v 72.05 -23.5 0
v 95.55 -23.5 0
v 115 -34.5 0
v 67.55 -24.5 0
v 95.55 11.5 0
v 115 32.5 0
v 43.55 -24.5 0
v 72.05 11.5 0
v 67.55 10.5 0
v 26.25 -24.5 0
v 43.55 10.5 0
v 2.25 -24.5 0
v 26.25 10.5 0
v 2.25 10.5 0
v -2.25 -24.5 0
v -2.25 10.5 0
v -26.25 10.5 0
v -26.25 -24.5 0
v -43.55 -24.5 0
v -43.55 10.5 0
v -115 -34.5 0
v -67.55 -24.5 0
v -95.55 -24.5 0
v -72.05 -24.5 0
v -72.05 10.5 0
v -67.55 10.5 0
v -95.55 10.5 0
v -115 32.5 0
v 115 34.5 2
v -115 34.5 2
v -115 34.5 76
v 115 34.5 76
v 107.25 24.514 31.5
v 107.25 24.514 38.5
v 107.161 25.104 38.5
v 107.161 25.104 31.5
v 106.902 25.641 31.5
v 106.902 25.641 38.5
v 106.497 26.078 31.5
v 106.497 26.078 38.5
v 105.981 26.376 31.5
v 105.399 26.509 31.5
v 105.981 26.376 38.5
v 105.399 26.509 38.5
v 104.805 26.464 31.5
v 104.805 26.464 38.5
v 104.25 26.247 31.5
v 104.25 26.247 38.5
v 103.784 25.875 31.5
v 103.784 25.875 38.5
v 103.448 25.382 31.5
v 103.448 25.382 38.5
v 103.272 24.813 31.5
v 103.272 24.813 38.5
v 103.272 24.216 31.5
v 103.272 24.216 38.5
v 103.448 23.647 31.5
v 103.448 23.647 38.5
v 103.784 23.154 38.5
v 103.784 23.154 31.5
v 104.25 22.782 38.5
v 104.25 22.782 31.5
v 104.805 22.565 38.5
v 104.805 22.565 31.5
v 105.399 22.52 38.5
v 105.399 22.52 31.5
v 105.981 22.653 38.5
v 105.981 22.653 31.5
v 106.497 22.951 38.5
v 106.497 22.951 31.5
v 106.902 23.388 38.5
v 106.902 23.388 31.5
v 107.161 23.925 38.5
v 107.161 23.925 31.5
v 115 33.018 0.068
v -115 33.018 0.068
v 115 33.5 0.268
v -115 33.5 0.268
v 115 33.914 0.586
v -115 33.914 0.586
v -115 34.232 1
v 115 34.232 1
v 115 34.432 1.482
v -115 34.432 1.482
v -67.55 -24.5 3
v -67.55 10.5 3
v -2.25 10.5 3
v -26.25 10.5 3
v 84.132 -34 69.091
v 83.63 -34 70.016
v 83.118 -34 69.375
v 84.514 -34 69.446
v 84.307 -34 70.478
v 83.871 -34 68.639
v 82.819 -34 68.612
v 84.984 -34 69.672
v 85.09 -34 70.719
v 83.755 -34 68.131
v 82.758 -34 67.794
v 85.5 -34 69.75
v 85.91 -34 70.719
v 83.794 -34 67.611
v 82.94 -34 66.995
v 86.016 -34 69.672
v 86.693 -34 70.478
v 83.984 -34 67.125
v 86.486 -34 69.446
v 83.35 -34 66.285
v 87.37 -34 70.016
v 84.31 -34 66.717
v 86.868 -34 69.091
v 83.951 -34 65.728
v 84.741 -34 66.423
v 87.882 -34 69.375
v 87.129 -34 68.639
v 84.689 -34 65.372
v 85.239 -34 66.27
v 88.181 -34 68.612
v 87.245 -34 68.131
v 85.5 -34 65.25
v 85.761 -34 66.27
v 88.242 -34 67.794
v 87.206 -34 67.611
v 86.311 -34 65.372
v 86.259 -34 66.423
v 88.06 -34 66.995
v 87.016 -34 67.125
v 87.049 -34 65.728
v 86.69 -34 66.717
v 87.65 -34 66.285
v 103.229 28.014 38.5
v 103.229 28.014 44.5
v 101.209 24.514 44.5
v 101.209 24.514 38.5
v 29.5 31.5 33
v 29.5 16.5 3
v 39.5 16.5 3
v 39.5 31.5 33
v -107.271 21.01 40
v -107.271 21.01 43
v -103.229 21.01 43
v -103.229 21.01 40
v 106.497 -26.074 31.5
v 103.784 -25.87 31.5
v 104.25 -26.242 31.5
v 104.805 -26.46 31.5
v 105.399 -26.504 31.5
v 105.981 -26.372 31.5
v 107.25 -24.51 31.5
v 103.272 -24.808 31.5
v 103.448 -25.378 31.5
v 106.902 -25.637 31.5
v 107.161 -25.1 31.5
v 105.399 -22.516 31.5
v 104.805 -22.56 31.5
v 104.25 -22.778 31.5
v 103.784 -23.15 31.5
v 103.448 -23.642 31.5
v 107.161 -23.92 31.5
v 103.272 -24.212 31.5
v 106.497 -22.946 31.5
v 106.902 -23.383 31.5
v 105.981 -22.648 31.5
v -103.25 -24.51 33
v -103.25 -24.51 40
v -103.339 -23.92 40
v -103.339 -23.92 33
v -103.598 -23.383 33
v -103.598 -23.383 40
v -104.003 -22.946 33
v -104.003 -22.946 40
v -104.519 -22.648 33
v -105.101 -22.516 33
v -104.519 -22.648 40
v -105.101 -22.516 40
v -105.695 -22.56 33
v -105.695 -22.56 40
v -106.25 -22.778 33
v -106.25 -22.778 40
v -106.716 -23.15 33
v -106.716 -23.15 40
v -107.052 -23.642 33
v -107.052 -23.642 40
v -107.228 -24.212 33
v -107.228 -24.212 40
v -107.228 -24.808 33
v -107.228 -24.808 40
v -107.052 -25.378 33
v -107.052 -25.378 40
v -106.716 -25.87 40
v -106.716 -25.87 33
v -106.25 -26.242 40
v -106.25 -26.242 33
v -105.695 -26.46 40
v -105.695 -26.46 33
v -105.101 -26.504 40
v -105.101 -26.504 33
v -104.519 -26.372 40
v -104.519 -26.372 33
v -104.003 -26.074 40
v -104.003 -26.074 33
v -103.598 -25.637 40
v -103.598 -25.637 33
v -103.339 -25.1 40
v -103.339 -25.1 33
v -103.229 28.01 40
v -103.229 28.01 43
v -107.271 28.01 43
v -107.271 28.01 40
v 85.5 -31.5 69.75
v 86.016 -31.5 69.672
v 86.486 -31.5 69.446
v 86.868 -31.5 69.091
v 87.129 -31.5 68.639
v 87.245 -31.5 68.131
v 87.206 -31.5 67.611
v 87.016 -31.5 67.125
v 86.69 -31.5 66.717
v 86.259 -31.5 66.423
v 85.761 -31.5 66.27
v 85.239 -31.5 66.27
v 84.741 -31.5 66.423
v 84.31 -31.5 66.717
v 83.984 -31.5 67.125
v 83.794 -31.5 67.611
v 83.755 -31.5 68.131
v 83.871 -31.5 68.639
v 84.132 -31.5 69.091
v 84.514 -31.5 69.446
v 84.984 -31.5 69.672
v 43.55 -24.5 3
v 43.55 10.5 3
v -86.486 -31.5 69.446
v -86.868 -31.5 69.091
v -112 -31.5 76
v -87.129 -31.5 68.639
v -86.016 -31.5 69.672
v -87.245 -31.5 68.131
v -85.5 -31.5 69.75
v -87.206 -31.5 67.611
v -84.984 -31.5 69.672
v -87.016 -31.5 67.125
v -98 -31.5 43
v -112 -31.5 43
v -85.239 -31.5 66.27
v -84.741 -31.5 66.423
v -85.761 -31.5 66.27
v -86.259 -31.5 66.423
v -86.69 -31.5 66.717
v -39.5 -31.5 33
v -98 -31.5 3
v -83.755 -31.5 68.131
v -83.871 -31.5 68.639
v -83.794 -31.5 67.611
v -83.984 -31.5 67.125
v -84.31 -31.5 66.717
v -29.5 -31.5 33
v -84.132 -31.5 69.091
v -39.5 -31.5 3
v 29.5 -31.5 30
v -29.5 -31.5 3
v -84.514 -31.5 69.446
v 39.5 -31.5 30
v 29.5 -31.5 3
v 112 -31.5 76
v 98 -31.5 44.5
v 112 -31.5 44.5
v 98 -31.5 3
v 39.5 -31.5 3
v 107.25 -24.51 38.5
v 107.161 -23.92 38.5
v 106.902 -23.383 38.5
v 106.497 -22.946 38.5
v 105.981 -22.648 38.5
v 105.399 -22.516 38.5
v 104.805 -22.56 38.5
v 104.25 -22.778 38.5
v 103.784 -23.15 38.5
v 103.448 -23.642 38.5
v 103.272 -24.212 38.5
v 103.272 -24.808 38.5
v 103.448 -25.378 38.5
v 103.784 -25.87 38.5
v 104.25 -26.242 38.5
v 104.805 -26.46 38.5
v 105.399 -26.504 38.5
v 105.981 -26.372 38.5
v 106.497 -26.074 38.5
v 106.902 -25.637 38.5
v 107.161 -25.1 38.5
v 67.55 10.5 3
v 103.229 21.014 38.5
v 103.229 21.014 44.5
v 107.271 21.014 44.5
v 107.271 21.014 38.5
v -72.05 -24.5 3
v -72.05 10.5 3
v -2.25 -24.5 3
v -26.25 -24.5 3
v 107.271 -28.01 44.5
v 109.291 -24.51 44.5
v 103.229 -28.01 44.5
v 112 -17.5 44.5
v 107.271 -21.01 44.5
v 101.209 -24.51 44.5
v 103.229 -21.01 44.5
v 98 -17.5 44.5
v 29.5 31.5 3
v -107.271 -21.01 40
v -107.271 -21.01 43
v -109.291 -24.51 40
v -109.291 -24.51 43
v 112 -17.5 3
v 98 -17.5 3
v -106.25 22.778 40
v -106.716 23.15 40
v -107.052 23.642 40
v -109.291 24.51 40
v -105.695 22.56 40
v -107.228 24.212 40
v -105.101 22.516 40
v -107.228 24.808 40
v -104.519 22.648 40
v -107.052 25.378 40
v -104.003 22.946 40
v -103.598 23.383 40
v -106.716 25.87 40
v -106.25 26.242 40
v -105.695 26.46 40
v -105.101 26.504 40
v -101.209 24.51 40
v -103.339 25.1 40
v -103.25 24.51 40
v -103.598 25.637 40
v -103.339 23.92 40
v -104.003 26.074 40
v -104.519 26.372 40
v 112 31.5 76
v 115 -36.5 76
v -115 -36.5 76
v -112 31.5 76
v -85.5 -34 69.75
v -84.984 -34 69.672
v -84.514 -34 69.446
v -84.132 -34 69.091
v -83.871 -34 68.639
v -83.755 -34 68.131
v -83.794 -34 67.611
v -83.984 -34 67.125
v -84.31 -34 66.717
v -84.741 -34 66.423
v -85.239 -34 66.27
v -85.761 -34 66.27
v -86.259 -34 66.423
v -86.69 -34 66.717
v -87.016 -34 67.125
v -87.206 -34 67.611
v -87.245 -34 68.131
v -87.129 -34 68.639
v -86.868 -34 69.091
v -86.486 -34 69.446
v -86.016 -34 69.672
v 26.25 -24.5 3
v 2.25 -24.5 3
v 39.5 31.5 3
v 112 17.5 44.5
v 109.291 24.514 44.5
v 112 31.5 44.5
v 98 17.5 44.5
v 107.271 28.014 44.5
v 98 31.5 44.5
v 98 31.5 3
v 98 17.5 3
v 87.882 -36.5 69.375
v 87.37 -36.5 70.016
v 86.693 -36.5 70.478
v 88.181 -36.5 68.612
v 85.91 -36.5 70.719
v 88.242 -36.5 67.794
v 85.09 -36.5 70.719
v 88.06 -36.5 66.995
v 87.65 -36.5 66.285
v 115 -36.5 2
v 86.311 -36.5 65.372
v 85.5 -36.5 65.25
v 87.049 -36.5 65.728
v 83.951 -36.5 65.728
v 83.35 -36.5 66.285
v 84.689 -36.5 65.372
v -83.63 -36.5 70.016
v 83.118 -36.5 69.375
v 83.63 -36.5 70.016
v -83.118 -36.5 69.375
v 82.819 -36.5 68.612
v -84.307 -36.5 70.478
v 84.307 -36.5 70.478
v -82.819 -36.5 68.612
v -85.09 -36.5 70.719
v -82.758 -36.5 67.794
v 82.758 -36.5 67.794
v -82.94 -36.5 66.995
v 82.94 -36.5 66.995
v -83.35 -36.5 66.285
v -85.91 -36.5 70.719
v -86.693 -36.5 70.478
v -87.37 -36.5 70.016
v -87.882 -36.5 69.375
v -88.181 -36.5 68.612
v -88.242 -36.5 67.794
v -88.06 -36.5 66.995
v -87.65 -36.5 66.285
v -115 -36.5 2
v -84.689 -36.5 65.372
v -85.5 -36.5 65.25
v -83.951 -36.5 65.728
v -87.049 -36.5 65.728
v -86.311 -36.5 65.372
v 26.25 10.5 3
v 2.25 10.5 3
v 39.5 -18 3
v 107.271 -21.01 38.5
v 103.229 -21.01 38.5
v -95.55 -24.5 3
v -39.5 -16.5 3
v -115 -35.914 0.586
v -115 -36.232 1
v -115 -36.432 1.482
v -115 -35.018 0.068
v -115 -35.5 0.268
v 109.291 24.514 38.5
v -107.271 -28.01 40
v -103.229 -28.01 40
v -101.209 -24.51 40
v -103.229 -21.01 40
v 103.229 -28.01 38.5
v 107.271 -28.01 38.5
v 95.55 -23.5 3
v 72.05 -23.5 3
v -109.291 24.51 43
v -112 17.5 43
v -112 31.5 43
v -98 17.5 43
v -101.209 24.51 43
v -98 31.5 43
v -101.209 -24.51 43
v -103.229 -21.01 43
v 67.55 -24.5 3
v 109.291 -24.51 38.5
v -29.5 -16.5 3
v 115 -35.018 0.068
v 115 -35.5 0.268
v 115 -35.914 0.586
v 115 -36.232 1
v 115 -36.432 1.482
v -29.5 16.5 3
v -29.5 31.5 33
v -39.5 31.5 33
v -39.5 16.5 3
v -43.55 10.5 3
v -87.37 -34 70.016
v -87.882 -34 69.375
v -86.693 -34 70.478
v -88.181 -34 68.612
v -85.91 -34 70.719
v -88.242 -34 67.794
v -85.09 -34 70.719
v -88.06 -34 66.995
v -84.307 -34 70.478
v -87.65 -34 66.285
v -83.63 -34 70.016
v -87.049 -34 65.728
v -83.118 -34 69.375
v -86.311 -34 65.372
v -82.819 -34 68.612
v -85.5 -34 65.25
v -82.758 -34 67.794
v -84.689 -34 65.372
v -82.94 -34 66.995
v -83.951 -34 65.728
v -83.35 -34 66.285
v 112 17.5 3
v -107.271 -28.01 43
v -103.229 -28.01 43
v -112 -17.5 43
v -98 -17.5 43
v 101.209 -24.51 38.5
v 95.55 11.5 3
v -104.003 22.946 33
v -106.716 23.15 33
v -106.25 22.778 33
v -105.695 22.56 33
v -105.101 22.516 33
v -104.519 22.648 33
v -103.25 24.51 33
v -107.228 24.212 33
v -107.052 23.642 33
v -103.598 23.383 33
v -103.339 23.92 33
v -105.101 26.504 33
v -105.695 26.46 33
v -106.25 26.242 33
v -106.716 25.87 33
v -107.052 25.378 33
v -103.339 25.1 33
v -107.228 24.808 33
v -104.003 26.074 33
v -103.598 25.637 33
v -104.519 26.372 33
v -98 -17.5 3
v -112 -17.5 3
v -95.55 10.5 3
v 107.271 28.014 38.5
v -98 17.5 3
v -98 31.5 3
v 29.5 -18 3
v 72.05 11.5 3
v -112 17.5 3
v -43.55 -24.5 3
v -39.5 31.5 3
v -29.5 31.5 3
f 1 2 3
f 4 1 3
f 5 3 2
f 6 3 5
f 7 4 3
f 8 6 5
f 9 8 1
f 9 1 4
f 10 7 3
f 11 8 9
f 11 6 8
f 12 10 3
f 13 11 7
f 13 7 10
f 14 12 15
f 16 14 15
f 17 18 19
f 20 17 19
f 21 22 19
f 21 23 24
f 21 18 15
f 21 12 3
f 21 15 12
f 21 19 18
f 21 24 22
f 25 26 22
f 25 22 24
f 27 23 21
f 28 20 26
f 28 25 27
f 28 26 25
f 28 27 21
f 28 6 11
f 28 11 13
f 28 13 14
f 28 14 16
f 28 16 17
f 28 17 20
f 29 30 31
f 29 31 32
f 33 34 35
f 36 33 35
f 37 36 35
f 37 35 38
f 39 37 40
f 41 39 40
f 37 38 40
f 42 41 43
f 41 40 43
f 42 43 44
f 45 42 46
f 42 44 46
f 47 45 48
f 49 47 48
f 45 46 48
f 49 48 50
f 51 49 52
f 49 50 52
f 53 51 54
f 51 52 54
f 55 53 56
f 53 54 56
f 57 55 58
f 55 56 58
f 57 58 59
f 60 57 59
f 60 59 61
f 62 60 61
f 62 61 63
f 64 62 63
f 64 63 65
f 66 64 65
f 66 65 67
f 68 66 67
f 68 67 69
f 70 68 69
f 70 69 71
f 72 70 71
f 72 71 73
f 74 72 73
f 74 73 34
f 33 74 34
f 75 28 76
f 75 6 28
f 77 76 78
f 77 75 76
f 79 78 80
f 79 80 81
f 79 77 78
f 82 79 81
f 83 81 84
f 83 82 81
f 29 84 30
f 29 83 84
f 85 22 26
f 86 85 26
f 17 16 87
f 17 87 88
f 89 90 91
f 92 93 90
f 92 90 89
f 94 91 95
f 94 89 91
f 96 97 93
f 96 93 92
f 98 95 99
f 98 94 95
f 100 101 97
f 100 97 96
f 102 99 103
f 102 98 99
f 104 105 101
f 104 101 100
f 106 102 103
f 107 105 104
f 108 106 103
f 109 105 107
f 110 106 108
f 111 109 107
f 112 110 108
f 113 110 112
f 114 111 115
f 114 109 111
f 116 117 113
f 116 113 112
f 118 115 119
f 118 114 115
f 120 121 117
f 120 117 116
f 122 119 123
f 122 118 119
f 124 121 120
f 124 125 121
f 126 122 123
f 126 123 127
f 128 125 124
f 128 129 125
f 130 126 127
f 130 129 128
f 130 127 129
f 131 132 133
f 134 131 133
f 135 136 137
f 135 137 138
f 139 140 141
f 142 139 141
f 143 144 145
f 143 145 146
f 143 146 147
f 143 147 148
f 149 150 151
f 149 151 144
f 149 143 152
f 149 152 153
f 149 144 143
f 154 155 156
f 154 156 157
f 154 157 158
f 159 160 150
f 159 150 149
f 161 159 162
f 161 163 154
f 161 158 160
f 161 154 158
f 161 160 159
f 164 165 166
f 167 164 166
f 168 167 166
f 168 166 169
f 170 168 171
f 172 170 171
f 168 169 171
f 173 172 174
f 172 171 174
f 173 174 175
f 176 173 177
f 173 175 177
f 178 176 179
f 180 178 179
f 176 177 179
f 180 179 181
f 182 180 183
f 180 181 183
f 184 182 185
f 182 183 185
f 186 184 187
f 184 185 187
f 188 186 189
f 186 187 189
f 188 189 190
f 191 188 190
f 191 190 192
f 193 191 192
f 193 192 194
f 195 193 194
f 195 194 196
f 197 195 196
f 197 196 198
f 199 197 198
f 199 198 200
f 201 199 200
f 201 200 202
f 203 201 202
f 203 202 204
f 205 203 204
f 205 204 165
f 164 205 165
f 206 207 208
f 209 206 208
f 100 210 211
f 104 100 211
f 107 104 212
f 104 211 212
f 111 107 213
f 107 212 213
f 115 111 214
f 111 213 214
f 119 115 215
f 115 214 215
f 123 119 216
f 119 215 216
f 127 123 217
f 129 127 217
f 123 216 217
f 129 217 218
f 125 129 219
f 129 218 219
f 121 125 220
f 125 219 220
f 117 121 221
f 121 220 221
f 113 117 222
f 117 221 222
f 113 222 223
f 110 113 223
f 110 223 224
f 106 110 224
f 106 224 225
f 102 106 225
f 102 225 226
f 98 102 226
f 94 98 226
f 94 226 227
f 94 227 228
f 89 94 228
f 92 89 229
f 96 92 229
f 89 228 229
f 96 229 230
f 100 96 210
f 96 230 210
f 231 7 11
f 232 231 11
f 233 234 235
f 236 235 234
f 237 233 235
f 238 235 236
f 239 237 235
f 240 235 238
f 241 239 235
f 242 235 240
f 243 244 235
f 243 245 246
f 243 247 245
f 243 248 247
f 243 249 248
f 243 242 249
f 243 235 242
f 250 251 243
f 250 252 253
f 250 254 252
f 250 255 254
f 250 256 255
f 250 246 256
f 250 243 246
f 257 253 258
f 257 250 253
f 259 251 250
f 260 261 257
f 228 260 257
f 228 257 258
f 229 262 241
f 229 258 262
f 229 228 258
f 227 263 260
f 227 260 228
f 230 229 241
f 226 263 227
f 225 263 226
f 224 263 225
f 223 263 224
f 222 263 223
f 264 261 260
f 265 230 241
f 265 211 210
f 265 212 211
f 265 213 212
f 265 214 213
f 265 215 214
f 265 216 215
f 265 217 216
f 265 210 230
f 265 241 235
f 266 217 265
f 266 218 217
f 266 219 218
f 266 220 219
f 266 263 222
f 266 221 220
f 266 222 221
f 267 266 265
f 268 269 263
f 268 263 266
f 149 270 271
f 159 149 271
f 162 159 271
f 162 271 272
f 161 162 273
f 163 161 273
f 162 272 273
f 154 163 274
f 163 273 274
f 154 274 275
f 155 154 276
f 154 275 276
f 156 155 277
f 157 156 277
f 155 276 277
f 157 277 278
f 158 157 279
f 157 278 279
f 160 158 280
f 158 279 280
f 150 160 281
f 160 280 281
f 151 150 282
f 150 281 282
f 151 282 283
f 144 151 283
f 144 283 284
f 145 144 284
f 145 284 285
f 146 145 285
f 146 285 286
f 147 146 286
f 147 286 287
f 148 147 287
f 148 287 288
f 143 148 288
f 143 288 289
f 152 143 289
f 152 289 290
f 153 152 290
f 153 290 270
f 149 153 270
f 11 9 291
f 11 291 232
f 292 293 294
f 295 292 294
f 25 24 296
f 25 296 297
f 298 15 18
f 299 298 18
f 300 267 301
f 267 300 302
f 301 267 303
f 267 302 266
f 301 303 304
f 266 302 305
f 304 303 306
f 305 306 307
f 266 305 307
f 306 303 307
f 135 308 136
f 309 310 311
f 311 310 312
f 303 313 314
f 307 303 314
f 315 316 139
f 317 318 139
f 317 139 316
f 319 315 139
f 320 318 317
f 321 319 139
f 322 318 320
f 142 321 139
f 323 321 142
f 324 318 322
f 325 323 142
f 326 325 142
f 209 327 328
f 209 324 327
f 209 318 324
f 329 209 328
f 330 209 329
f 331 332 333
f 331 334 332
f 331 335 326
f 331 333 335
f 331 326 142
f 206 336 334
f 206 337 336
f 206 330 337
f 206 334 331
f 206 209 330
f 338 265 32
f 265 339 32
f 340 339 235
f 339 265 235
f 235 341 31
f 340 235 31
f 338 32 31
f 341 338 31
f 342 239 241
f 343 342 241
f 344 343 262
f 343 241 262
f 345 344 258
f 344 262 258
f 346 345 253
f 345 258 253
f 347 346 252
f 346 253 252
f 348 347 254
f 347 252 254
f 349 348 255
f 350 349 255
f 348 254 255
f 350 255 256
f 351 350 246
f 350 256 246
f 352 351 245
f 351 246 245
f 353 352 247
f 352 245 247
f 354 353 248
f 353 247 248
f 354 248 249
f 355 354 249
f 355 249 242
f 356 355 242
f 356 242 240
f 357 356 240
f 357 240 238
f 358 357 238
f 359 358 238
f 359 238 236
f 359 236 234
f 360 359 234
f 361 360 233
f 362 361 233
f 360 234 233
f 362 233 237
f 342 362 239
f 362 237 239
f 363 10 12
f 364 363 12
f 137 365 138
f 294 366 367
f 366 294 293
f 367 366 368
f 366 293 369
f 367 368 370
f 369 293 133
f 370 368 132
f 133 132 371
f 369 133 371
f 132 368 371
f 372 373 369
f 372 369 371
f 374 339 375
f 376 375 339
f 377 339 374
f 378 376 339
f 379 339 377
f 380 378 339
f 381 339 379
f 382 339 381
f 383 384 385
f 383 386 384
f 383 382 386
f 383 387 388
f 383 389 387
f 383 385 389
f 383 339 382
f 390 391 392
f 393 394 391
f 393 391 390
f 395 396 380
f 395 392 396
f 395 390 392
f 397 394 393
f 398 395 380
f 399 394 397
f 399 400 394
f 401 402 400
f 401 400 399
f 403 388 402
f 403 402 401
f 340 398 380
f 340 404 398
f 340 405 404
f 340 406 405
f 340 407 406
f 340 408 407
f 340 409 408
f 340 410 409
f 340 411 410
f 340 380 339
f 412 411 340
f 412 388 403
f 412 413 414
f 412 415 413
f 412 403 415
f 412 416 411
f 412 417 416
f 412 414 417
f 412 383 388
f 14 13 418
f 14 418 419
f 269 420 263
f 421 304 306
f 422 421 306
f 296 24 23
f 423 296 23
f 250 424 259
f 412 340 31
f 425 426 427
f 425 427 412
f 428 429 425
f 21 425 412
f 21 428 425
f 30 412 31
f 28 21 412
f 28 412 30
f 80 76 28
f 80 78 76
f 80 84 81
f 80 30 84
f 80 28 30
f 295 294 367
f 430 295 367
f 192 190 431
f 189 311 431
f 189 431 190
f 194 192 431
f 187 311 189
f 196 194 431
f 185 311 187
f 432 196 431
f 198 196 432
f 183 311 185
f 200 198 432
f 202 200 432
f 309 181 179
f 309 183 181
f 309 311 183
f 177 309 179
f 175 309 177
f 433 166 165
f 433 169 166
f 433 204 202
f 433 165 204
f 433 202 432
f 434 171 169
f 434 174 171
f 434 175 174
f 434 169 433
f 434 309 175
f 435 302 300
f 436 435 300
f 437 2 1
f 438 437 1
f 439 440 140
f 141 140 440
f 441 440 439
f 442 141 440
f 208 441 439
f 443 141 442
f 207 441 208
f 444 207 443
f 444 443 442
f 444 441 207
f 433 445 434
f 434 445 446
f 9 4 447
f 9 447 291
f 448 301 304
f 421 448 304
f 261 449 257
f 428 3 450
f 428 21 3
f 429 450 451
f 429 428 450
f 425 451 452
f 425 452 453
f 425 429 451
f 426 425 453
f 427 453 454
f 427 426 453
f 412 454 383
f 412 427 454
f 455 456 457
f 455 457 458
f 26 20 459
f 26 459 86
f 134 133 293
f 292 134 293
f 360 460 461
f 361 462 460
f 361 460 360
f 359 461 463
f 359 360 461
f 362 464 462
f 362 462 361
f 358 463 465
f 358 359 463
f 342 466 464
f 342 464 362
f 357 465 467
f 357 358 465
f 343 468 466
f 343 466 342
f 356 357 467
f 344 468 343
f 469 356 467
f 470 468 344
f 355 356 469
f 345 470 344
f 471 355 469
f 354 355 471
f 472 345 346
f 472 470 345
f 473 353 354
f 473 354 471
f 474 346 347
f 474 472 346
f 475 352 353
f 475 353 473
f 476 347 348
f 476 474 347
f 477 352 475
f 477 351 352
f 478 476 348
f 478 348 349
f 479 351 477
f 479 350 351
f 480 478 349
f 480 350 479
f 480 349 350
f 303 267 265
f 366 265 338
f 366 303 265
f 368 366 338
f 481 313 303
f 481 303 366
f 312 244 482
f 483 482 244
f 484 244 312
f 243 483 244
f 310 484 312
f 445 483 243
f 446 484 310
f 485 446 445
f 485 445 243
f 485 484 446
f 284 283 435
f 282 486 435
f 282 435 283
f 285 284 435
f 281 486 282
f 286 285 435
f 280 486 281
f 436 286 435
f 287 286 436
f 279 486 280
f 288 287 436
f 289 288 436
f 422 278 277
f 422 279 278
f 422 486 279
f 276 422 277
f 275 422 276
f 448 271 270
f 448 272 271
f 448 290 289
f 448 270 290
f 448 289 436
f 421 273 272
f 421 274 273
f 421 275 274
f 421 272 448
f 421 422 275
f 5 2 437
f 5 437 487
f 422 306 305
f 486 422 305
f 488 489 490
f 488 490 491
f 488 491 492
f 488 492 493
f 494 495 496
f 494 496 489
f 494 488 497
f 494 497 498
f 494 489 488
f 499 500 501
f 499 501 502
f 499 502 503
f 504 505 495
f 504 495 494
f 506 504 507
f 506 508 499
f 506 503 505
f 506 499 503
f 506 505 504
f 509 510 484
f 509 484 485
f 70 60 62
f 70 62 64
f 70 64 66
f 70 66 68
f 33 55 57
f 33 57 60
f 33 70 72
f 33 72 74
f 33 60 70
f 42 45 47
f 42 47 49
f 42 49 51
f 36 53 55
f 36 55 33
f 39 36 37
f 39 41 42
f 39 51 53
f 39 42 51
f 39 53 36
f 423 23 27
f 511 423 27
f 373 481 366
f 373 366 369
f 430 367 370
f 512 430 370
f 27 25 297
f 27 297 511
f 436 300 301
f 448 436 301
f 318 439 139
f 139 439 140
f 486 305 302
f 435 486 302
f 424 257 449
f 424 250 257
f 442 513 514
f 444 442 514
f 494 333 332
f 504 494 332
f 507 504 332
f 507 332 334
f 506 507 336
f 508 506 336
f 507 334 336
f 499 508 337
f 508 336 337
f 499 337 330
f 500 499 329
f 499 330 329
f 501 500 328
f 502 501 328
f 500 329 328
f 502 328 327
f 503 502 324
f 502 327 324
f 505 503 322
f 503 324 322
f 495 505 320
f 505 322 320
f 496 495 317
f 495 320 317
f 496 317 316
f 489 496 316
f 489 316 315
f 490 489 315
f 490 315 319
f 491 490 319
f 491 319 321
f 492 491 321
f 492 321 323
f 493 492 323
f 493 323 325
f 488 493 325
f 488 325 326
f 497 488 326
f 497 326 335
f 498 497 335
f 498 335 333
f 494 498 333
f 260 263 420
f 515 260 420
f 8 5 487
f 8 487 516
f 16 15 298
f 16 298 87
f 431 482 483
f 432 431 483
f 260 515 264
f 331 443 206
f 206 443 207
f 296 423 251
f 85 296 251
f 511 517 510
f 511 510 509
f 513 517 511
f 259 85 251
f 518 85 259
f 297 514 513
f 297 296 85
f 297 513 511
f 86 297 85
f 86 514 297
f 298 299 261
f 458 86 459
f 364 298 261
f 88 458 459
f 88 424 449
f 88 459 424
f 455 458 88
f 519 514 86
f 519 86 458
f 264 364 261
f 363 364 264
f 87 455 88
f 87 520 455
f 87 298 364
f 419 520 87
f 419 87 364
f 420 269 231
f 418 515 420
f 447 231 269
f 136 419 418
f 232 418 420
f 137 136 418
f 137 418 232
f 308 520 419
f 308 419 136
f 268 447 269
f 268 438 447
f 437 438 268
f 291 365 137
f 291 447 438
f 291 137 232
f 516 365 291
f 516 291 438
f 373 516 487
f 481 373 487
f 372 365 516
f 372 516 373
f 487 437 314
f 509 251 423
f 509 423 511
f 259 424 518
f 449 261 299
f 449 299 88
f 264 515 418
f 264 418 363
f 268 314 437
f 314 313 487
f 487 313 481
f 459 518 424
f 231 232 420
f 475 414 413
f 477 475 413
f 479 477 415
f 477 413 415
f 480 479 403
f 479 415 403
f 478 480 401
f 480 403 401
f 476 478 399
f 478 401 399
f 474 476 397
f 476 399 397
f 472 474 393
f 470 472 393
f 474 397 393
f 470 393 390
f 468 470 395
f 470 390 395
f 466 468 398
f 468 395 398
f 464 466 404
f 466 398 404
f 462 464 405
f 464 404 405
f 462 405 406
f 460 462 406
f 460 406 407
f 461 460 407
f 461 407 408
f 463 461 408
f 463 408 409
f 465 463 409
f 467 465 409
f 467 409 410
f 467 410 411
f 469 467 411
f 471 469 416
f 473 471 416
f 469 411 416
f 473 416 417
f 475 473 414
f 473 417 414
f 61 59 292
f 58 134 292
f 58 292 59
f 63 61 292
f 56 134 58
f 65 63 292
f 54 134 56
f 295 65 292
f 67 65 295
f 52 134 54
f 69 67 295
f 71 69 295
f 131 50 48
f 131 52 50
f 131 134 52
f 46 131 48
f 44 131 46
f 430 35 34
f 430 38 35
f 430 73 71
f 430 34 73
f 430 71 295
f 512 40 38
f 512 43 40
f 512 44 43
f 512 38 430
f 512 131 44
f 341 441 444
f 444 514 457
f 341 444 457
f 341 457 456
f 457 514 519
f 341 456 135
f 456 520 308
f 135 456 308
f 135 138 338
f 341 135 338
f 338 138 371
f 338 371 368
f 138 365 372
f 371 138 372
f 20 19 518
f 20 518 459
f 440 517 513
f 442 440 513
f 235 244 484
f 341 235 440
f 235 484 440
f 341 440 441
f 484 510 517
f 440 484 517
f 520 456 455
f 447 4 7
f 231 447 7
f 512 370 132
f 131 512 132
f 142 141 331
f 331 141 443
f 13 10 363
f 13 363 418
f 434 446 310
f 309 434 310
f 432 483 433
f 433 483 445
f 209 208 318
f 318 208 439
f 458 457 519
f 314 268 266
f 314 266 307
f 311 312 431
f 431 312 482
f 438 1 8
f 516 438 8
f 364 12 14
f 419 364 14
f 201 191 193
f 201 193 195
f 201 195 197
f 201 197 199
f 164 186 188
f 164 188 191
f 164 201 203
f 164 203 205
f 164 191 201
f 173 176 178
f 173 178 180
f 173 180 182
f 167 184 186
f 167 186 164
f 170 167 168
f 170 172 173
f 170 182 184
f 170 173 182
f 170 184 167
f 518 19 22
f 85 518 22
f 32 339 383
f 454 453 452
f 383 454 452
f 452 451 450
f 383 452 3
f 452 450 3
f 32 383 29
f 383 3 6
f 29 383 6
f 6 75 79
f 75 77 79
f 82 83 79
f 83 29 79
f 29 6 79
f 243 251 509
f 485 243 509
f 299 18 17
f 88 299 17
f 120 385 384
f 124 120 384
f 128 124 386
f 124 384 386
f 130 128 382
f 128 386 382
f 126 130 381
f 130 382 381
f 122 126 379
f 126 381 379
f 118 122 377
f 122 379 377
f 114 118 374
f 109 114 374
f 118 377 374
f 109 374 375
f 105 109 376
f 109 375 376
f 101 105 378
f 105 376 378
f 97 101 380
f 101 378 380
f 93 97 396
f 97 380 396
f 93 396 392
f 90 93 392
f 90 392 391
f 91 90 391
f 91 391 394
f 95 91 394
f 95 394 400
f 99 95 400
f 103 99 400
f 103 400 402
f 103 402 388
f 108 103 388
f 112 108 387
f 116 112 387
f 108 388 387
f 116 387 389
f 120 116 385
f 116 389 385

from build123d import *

# Parameters (mm, degrees)
SKETCH_1_W           = 224
SKETCH_1_H           = 63
EXTRUDE_6_DEPTH      = 3
SKETCH_1_3_W         = 230
SKETCH_1_3_H         = 69
SKETCH_1_3_W_2       = 224
SKETCH_1_3_H_2       = 63
EXTRUDE_1_DEPTH      = 76
SKETCH_6_W           = 23.5
SKETCH_6_H           = 35
SKETCH_6_W_2         = 24
CUT_EXTRUDE_1_DEPTH  = 4
SKETCH_8_W           = 14
SKETCH_8_H           = 14
EXTRUDE_8_DEPTH      = 40
SKETCH_11_R          = 2
CUT_EXTRUDE_2_DEPTH  = 10
CUT_EXTRUDE_4_DEPTH  = 3
SKETCH_14_W          = 14
SKETCH_14_H          = 14
EXTRUDE_9_DEPTH      = 44.5
SKETCH_15_R          = 2
CUT_EXTRUDE_5_DEPTH  = 13
CUT_EXTRUDE_11_DEPTH = 6
EXTRUDE_10_DEPTH     = 5
EXTRUDE_11_DEPTH     = 5
SKETCH_30_W          = 230
SKETCH_30_H          = 2
EXTRUDE_13_DEPTH     = 76
FILLET_3_R           = 2
SKETCH_31_R          = 2.75
CUT_EXTRUDE_13_DEPTH = 2.5
SKETCH_28_R          = 1.75
CUT_EXTRUDE_14_DEPTH = 2.5


with BuildPart() as part:
    # 草图1 → 凸台-拉伸6 (new body)
    with BuildSketch(Plane.XY):
        Rectangle(SKETCH_1_W, SKETCH_1_H)
    extrude(amount=EXTRUDE_6_DEPTH)

    # 草图1<3> → 拉伸-薄壁1 (add)
    with BuildSketch(Plane.XY):
        Rectangle(SKETCH_1_3_W, SKETCH_1_3_H)
        Rectangle(SKETCH_1_3_W_2, SKETCH_1_3_H_2, mode=Mode.SUBTRACT)
    extrude(amount=EXTRUDE_1_DEPTH)

    # 草图6 → 切除-拉伸1 (cut)
    with BuildSketch(Plane(origin=(0, 0, 0), x_dir=(-1, 0, 0), z_dir=(0, 0, -1))):
        with Locations((-83.8, -6)):
            Rectangle(SKETCH_6_W, SKETCH_6_H)
        with Locations((-55.55, -7)):
            Rectangle(SKETCH_6_W_2, SKETCH_6_H)
        with Locations((-14.25, -7)):
            Rectangle(SKETCH_6_W_2, SKETCH_6_H)
        with Locations((14.25, -7)):
            Rectangle(SKETCH_6_W_2, SKETCH_6_H)
        with Locations((55.55, -7)):
            Rectangle(SKETCH_6_W_2, SKETCH_6_H)
        with Locations((83.8, -7)):
            Rectangle(SKETCH_6_W, SKETCH_6_H)
    extrude(amount=-CUT_EXTRUDE_1_DEPTH, mode=Mode.SUBTRACT)

    # 草图8 → 凸台-拉伸8 (add)
    with BuildSketch(Plane.XY.offset(3)):
        with Locations((-105, 24.5)):
            Rectangle(SKETCH_8_W, SKETCH_8_H)
        with Locations((-105, -24.5)):
            Rectangle(SKETCH_8_W, SKETCH_8_H)
    extrude(amount=EXTRUDE_8_DEPTH)

    # 草图11 → 切除-拉伸2 (cut)
    with BuildSketch(Plane.XY.offset(43)):
        with Locations((-105.25, 24.51)):
            Circle(SKETCH_11_R)
        with Locations((-105.25, -24.51)):
            Circle(SKETCH_11_R)
    extrude(amount=-CUT_EXTRUDE_2_DEPTH, mode=Mode.SUBTRACT)

    # 草图12<2> → 切除-拉伸4 (cut)
    with BuildSketch(Plane.XY.offset(43)):
        Polygon((-107.270725942, 28.01), (-109.291451884, 24.51), (-107.270725942, 21.01), (-103.229274058, 21.01), (-101.208548116, 24.51), (-103.229274058, 28.01), align=None)
        Polygon((-101.208548116, -24.51), (-103.229274058, -21.01), (-107.270725942, -21.01), (-109.291451884, -24.51), (-107.270725942, -28.01), (-103.229274058, -28.01), align=None)
    extrude(amount=-CUT_EXTRUDE_4_DEPTH, mode=Mode.SUBTRACT)

    # 草图14 → 凸台-拉伸9 (add)
    with BuildSketch(Plane(origin=(0, 0, 0), x_dir=(-1, 0, 0), z_dir=(0, 0, -1))):
        with Locations((-105, 24.5)):
            Rectangle(SKETCH_14_W, SKETCH_14_H)
        with Locations((-105, -24.5)):
            Rectangle(SKETCH_14_W, SKETCH_14_H)
    extrude(amount=-EXTRUDE_9_DEPTH)

    # 草图15 → 切除-拉伸5 (cut)
    with BuildSketch(Plane.XY.offset(44.5)):
        with Locations((105.25, 24.514472103)):
            Circle(SKETCH_15_R)
        with Locations((105.25, -24.51)):
            Circle(SKETCH_15_R)
    extrude(amount=-CUT_EXTRUDE_5_DEPTH, mode=Mode.SUBTRACT)

    # 草图16 → 切除-拉伸11 (cut)
    with BuildSketch(Plane.XY.offset(44.5)):
        Polygon((103.229274058, 21.014472103), (107.270725942, 21.014472103), (109.291451884, 24.514472103), (107.270725942, 28.014472103), (103.229274058, 28.014472103), (101.208548116, 24.514472103), align=None)
        Polygon((103.229274058, -28.01), (107.270725942, -28.01), (109.291451884, -24.51), (107.270725942, -21.01), (103.229274058, -21.01), (101.208548116, -24.51), align=None)
    extrude(amount=-CUT_EXTRUDE_11_DEPTH, mode=Mode.SUBTRACT)

    # 草图21 → 凸台-拉伸10 (add, symmetric)
    with BuildSketch(Plane.ZY.offset(34.5)):
        Polygon((3, 31.5), (33, 31.5), (3, 16.5), align=None)
        Polygon((3, -16.5), (3, -31.5), (33, -31.5), align=None)
    extrude(amount=EXTRUDE_10_DEPTH, both=True)

    # 草图22 → 凸台-拉伸11 (add, symmetric)
    with BuildSketch(Plane(origin=(34.5, 0, 0), x_dir=(0, 0, -1), z_dir=(1, 0, 0))):
        Polygon((-3, 31.5), (-3, 16.5), (-33, 31.5), align=None)
        Polygon((0, -16.5), (0, -31.5), (-30, -31.5), align=None)
    extrude(amount=EXTRUDE_11_DEPTH, both=True)

    # 草图30 → 凸台-拉伸13 (add)
    with BuildSketch(Plane(origin=(0, 0, 0), x_dir=(-1, 0, 0), z_dir=(0, 0, -1))):
        with Locations((0, -35.5)):
            Rectangle(SKETCH_30_W, SKETCH_30_H)
    extrude(amount=-EXTRUDE_13_DEPTH)

    # 圆角3
    fillet_3_edges = [part.edges().sort_by_distance(p)[0] for p in [
        (0, 34.5, 0),
        (0, -36.5, 0),
    ]]
    fillet(fillet_3_edges, radius=FILLET_3_R)

    # 草图31 → 切除-拉伸13 (cut)
    with BuildSketch(Plane.XZ.offset(36.5)):
        with Locations((-85.5, 68)):
            Circle(SKETCH_31_R)
        with Locations((85.5, 68)):
            Circle(SKETCH_31_R)
    extrude(amount=-CUT_EXTRUDE_13_DEPTH, mode=Mode.SUBTRACT)

    # 草图28 → 切除-拉伸14 (cut)
    with BuildSketch(Plane(origin=(0, -31.5, 0), x_dir=(1, 0, 0), z_dir=(0, 1, 0))):
        with Locations((85.5, -68)):
            Circle(SKETCH_28_R)
        with Locations((-85.5, -68)):
            Circle(SKETCH_28_R)
    extrude(amount=-CUT_EXTRUDE_14_DEPTH, mode=Mode.SUBTRACT)


solid = part.part
